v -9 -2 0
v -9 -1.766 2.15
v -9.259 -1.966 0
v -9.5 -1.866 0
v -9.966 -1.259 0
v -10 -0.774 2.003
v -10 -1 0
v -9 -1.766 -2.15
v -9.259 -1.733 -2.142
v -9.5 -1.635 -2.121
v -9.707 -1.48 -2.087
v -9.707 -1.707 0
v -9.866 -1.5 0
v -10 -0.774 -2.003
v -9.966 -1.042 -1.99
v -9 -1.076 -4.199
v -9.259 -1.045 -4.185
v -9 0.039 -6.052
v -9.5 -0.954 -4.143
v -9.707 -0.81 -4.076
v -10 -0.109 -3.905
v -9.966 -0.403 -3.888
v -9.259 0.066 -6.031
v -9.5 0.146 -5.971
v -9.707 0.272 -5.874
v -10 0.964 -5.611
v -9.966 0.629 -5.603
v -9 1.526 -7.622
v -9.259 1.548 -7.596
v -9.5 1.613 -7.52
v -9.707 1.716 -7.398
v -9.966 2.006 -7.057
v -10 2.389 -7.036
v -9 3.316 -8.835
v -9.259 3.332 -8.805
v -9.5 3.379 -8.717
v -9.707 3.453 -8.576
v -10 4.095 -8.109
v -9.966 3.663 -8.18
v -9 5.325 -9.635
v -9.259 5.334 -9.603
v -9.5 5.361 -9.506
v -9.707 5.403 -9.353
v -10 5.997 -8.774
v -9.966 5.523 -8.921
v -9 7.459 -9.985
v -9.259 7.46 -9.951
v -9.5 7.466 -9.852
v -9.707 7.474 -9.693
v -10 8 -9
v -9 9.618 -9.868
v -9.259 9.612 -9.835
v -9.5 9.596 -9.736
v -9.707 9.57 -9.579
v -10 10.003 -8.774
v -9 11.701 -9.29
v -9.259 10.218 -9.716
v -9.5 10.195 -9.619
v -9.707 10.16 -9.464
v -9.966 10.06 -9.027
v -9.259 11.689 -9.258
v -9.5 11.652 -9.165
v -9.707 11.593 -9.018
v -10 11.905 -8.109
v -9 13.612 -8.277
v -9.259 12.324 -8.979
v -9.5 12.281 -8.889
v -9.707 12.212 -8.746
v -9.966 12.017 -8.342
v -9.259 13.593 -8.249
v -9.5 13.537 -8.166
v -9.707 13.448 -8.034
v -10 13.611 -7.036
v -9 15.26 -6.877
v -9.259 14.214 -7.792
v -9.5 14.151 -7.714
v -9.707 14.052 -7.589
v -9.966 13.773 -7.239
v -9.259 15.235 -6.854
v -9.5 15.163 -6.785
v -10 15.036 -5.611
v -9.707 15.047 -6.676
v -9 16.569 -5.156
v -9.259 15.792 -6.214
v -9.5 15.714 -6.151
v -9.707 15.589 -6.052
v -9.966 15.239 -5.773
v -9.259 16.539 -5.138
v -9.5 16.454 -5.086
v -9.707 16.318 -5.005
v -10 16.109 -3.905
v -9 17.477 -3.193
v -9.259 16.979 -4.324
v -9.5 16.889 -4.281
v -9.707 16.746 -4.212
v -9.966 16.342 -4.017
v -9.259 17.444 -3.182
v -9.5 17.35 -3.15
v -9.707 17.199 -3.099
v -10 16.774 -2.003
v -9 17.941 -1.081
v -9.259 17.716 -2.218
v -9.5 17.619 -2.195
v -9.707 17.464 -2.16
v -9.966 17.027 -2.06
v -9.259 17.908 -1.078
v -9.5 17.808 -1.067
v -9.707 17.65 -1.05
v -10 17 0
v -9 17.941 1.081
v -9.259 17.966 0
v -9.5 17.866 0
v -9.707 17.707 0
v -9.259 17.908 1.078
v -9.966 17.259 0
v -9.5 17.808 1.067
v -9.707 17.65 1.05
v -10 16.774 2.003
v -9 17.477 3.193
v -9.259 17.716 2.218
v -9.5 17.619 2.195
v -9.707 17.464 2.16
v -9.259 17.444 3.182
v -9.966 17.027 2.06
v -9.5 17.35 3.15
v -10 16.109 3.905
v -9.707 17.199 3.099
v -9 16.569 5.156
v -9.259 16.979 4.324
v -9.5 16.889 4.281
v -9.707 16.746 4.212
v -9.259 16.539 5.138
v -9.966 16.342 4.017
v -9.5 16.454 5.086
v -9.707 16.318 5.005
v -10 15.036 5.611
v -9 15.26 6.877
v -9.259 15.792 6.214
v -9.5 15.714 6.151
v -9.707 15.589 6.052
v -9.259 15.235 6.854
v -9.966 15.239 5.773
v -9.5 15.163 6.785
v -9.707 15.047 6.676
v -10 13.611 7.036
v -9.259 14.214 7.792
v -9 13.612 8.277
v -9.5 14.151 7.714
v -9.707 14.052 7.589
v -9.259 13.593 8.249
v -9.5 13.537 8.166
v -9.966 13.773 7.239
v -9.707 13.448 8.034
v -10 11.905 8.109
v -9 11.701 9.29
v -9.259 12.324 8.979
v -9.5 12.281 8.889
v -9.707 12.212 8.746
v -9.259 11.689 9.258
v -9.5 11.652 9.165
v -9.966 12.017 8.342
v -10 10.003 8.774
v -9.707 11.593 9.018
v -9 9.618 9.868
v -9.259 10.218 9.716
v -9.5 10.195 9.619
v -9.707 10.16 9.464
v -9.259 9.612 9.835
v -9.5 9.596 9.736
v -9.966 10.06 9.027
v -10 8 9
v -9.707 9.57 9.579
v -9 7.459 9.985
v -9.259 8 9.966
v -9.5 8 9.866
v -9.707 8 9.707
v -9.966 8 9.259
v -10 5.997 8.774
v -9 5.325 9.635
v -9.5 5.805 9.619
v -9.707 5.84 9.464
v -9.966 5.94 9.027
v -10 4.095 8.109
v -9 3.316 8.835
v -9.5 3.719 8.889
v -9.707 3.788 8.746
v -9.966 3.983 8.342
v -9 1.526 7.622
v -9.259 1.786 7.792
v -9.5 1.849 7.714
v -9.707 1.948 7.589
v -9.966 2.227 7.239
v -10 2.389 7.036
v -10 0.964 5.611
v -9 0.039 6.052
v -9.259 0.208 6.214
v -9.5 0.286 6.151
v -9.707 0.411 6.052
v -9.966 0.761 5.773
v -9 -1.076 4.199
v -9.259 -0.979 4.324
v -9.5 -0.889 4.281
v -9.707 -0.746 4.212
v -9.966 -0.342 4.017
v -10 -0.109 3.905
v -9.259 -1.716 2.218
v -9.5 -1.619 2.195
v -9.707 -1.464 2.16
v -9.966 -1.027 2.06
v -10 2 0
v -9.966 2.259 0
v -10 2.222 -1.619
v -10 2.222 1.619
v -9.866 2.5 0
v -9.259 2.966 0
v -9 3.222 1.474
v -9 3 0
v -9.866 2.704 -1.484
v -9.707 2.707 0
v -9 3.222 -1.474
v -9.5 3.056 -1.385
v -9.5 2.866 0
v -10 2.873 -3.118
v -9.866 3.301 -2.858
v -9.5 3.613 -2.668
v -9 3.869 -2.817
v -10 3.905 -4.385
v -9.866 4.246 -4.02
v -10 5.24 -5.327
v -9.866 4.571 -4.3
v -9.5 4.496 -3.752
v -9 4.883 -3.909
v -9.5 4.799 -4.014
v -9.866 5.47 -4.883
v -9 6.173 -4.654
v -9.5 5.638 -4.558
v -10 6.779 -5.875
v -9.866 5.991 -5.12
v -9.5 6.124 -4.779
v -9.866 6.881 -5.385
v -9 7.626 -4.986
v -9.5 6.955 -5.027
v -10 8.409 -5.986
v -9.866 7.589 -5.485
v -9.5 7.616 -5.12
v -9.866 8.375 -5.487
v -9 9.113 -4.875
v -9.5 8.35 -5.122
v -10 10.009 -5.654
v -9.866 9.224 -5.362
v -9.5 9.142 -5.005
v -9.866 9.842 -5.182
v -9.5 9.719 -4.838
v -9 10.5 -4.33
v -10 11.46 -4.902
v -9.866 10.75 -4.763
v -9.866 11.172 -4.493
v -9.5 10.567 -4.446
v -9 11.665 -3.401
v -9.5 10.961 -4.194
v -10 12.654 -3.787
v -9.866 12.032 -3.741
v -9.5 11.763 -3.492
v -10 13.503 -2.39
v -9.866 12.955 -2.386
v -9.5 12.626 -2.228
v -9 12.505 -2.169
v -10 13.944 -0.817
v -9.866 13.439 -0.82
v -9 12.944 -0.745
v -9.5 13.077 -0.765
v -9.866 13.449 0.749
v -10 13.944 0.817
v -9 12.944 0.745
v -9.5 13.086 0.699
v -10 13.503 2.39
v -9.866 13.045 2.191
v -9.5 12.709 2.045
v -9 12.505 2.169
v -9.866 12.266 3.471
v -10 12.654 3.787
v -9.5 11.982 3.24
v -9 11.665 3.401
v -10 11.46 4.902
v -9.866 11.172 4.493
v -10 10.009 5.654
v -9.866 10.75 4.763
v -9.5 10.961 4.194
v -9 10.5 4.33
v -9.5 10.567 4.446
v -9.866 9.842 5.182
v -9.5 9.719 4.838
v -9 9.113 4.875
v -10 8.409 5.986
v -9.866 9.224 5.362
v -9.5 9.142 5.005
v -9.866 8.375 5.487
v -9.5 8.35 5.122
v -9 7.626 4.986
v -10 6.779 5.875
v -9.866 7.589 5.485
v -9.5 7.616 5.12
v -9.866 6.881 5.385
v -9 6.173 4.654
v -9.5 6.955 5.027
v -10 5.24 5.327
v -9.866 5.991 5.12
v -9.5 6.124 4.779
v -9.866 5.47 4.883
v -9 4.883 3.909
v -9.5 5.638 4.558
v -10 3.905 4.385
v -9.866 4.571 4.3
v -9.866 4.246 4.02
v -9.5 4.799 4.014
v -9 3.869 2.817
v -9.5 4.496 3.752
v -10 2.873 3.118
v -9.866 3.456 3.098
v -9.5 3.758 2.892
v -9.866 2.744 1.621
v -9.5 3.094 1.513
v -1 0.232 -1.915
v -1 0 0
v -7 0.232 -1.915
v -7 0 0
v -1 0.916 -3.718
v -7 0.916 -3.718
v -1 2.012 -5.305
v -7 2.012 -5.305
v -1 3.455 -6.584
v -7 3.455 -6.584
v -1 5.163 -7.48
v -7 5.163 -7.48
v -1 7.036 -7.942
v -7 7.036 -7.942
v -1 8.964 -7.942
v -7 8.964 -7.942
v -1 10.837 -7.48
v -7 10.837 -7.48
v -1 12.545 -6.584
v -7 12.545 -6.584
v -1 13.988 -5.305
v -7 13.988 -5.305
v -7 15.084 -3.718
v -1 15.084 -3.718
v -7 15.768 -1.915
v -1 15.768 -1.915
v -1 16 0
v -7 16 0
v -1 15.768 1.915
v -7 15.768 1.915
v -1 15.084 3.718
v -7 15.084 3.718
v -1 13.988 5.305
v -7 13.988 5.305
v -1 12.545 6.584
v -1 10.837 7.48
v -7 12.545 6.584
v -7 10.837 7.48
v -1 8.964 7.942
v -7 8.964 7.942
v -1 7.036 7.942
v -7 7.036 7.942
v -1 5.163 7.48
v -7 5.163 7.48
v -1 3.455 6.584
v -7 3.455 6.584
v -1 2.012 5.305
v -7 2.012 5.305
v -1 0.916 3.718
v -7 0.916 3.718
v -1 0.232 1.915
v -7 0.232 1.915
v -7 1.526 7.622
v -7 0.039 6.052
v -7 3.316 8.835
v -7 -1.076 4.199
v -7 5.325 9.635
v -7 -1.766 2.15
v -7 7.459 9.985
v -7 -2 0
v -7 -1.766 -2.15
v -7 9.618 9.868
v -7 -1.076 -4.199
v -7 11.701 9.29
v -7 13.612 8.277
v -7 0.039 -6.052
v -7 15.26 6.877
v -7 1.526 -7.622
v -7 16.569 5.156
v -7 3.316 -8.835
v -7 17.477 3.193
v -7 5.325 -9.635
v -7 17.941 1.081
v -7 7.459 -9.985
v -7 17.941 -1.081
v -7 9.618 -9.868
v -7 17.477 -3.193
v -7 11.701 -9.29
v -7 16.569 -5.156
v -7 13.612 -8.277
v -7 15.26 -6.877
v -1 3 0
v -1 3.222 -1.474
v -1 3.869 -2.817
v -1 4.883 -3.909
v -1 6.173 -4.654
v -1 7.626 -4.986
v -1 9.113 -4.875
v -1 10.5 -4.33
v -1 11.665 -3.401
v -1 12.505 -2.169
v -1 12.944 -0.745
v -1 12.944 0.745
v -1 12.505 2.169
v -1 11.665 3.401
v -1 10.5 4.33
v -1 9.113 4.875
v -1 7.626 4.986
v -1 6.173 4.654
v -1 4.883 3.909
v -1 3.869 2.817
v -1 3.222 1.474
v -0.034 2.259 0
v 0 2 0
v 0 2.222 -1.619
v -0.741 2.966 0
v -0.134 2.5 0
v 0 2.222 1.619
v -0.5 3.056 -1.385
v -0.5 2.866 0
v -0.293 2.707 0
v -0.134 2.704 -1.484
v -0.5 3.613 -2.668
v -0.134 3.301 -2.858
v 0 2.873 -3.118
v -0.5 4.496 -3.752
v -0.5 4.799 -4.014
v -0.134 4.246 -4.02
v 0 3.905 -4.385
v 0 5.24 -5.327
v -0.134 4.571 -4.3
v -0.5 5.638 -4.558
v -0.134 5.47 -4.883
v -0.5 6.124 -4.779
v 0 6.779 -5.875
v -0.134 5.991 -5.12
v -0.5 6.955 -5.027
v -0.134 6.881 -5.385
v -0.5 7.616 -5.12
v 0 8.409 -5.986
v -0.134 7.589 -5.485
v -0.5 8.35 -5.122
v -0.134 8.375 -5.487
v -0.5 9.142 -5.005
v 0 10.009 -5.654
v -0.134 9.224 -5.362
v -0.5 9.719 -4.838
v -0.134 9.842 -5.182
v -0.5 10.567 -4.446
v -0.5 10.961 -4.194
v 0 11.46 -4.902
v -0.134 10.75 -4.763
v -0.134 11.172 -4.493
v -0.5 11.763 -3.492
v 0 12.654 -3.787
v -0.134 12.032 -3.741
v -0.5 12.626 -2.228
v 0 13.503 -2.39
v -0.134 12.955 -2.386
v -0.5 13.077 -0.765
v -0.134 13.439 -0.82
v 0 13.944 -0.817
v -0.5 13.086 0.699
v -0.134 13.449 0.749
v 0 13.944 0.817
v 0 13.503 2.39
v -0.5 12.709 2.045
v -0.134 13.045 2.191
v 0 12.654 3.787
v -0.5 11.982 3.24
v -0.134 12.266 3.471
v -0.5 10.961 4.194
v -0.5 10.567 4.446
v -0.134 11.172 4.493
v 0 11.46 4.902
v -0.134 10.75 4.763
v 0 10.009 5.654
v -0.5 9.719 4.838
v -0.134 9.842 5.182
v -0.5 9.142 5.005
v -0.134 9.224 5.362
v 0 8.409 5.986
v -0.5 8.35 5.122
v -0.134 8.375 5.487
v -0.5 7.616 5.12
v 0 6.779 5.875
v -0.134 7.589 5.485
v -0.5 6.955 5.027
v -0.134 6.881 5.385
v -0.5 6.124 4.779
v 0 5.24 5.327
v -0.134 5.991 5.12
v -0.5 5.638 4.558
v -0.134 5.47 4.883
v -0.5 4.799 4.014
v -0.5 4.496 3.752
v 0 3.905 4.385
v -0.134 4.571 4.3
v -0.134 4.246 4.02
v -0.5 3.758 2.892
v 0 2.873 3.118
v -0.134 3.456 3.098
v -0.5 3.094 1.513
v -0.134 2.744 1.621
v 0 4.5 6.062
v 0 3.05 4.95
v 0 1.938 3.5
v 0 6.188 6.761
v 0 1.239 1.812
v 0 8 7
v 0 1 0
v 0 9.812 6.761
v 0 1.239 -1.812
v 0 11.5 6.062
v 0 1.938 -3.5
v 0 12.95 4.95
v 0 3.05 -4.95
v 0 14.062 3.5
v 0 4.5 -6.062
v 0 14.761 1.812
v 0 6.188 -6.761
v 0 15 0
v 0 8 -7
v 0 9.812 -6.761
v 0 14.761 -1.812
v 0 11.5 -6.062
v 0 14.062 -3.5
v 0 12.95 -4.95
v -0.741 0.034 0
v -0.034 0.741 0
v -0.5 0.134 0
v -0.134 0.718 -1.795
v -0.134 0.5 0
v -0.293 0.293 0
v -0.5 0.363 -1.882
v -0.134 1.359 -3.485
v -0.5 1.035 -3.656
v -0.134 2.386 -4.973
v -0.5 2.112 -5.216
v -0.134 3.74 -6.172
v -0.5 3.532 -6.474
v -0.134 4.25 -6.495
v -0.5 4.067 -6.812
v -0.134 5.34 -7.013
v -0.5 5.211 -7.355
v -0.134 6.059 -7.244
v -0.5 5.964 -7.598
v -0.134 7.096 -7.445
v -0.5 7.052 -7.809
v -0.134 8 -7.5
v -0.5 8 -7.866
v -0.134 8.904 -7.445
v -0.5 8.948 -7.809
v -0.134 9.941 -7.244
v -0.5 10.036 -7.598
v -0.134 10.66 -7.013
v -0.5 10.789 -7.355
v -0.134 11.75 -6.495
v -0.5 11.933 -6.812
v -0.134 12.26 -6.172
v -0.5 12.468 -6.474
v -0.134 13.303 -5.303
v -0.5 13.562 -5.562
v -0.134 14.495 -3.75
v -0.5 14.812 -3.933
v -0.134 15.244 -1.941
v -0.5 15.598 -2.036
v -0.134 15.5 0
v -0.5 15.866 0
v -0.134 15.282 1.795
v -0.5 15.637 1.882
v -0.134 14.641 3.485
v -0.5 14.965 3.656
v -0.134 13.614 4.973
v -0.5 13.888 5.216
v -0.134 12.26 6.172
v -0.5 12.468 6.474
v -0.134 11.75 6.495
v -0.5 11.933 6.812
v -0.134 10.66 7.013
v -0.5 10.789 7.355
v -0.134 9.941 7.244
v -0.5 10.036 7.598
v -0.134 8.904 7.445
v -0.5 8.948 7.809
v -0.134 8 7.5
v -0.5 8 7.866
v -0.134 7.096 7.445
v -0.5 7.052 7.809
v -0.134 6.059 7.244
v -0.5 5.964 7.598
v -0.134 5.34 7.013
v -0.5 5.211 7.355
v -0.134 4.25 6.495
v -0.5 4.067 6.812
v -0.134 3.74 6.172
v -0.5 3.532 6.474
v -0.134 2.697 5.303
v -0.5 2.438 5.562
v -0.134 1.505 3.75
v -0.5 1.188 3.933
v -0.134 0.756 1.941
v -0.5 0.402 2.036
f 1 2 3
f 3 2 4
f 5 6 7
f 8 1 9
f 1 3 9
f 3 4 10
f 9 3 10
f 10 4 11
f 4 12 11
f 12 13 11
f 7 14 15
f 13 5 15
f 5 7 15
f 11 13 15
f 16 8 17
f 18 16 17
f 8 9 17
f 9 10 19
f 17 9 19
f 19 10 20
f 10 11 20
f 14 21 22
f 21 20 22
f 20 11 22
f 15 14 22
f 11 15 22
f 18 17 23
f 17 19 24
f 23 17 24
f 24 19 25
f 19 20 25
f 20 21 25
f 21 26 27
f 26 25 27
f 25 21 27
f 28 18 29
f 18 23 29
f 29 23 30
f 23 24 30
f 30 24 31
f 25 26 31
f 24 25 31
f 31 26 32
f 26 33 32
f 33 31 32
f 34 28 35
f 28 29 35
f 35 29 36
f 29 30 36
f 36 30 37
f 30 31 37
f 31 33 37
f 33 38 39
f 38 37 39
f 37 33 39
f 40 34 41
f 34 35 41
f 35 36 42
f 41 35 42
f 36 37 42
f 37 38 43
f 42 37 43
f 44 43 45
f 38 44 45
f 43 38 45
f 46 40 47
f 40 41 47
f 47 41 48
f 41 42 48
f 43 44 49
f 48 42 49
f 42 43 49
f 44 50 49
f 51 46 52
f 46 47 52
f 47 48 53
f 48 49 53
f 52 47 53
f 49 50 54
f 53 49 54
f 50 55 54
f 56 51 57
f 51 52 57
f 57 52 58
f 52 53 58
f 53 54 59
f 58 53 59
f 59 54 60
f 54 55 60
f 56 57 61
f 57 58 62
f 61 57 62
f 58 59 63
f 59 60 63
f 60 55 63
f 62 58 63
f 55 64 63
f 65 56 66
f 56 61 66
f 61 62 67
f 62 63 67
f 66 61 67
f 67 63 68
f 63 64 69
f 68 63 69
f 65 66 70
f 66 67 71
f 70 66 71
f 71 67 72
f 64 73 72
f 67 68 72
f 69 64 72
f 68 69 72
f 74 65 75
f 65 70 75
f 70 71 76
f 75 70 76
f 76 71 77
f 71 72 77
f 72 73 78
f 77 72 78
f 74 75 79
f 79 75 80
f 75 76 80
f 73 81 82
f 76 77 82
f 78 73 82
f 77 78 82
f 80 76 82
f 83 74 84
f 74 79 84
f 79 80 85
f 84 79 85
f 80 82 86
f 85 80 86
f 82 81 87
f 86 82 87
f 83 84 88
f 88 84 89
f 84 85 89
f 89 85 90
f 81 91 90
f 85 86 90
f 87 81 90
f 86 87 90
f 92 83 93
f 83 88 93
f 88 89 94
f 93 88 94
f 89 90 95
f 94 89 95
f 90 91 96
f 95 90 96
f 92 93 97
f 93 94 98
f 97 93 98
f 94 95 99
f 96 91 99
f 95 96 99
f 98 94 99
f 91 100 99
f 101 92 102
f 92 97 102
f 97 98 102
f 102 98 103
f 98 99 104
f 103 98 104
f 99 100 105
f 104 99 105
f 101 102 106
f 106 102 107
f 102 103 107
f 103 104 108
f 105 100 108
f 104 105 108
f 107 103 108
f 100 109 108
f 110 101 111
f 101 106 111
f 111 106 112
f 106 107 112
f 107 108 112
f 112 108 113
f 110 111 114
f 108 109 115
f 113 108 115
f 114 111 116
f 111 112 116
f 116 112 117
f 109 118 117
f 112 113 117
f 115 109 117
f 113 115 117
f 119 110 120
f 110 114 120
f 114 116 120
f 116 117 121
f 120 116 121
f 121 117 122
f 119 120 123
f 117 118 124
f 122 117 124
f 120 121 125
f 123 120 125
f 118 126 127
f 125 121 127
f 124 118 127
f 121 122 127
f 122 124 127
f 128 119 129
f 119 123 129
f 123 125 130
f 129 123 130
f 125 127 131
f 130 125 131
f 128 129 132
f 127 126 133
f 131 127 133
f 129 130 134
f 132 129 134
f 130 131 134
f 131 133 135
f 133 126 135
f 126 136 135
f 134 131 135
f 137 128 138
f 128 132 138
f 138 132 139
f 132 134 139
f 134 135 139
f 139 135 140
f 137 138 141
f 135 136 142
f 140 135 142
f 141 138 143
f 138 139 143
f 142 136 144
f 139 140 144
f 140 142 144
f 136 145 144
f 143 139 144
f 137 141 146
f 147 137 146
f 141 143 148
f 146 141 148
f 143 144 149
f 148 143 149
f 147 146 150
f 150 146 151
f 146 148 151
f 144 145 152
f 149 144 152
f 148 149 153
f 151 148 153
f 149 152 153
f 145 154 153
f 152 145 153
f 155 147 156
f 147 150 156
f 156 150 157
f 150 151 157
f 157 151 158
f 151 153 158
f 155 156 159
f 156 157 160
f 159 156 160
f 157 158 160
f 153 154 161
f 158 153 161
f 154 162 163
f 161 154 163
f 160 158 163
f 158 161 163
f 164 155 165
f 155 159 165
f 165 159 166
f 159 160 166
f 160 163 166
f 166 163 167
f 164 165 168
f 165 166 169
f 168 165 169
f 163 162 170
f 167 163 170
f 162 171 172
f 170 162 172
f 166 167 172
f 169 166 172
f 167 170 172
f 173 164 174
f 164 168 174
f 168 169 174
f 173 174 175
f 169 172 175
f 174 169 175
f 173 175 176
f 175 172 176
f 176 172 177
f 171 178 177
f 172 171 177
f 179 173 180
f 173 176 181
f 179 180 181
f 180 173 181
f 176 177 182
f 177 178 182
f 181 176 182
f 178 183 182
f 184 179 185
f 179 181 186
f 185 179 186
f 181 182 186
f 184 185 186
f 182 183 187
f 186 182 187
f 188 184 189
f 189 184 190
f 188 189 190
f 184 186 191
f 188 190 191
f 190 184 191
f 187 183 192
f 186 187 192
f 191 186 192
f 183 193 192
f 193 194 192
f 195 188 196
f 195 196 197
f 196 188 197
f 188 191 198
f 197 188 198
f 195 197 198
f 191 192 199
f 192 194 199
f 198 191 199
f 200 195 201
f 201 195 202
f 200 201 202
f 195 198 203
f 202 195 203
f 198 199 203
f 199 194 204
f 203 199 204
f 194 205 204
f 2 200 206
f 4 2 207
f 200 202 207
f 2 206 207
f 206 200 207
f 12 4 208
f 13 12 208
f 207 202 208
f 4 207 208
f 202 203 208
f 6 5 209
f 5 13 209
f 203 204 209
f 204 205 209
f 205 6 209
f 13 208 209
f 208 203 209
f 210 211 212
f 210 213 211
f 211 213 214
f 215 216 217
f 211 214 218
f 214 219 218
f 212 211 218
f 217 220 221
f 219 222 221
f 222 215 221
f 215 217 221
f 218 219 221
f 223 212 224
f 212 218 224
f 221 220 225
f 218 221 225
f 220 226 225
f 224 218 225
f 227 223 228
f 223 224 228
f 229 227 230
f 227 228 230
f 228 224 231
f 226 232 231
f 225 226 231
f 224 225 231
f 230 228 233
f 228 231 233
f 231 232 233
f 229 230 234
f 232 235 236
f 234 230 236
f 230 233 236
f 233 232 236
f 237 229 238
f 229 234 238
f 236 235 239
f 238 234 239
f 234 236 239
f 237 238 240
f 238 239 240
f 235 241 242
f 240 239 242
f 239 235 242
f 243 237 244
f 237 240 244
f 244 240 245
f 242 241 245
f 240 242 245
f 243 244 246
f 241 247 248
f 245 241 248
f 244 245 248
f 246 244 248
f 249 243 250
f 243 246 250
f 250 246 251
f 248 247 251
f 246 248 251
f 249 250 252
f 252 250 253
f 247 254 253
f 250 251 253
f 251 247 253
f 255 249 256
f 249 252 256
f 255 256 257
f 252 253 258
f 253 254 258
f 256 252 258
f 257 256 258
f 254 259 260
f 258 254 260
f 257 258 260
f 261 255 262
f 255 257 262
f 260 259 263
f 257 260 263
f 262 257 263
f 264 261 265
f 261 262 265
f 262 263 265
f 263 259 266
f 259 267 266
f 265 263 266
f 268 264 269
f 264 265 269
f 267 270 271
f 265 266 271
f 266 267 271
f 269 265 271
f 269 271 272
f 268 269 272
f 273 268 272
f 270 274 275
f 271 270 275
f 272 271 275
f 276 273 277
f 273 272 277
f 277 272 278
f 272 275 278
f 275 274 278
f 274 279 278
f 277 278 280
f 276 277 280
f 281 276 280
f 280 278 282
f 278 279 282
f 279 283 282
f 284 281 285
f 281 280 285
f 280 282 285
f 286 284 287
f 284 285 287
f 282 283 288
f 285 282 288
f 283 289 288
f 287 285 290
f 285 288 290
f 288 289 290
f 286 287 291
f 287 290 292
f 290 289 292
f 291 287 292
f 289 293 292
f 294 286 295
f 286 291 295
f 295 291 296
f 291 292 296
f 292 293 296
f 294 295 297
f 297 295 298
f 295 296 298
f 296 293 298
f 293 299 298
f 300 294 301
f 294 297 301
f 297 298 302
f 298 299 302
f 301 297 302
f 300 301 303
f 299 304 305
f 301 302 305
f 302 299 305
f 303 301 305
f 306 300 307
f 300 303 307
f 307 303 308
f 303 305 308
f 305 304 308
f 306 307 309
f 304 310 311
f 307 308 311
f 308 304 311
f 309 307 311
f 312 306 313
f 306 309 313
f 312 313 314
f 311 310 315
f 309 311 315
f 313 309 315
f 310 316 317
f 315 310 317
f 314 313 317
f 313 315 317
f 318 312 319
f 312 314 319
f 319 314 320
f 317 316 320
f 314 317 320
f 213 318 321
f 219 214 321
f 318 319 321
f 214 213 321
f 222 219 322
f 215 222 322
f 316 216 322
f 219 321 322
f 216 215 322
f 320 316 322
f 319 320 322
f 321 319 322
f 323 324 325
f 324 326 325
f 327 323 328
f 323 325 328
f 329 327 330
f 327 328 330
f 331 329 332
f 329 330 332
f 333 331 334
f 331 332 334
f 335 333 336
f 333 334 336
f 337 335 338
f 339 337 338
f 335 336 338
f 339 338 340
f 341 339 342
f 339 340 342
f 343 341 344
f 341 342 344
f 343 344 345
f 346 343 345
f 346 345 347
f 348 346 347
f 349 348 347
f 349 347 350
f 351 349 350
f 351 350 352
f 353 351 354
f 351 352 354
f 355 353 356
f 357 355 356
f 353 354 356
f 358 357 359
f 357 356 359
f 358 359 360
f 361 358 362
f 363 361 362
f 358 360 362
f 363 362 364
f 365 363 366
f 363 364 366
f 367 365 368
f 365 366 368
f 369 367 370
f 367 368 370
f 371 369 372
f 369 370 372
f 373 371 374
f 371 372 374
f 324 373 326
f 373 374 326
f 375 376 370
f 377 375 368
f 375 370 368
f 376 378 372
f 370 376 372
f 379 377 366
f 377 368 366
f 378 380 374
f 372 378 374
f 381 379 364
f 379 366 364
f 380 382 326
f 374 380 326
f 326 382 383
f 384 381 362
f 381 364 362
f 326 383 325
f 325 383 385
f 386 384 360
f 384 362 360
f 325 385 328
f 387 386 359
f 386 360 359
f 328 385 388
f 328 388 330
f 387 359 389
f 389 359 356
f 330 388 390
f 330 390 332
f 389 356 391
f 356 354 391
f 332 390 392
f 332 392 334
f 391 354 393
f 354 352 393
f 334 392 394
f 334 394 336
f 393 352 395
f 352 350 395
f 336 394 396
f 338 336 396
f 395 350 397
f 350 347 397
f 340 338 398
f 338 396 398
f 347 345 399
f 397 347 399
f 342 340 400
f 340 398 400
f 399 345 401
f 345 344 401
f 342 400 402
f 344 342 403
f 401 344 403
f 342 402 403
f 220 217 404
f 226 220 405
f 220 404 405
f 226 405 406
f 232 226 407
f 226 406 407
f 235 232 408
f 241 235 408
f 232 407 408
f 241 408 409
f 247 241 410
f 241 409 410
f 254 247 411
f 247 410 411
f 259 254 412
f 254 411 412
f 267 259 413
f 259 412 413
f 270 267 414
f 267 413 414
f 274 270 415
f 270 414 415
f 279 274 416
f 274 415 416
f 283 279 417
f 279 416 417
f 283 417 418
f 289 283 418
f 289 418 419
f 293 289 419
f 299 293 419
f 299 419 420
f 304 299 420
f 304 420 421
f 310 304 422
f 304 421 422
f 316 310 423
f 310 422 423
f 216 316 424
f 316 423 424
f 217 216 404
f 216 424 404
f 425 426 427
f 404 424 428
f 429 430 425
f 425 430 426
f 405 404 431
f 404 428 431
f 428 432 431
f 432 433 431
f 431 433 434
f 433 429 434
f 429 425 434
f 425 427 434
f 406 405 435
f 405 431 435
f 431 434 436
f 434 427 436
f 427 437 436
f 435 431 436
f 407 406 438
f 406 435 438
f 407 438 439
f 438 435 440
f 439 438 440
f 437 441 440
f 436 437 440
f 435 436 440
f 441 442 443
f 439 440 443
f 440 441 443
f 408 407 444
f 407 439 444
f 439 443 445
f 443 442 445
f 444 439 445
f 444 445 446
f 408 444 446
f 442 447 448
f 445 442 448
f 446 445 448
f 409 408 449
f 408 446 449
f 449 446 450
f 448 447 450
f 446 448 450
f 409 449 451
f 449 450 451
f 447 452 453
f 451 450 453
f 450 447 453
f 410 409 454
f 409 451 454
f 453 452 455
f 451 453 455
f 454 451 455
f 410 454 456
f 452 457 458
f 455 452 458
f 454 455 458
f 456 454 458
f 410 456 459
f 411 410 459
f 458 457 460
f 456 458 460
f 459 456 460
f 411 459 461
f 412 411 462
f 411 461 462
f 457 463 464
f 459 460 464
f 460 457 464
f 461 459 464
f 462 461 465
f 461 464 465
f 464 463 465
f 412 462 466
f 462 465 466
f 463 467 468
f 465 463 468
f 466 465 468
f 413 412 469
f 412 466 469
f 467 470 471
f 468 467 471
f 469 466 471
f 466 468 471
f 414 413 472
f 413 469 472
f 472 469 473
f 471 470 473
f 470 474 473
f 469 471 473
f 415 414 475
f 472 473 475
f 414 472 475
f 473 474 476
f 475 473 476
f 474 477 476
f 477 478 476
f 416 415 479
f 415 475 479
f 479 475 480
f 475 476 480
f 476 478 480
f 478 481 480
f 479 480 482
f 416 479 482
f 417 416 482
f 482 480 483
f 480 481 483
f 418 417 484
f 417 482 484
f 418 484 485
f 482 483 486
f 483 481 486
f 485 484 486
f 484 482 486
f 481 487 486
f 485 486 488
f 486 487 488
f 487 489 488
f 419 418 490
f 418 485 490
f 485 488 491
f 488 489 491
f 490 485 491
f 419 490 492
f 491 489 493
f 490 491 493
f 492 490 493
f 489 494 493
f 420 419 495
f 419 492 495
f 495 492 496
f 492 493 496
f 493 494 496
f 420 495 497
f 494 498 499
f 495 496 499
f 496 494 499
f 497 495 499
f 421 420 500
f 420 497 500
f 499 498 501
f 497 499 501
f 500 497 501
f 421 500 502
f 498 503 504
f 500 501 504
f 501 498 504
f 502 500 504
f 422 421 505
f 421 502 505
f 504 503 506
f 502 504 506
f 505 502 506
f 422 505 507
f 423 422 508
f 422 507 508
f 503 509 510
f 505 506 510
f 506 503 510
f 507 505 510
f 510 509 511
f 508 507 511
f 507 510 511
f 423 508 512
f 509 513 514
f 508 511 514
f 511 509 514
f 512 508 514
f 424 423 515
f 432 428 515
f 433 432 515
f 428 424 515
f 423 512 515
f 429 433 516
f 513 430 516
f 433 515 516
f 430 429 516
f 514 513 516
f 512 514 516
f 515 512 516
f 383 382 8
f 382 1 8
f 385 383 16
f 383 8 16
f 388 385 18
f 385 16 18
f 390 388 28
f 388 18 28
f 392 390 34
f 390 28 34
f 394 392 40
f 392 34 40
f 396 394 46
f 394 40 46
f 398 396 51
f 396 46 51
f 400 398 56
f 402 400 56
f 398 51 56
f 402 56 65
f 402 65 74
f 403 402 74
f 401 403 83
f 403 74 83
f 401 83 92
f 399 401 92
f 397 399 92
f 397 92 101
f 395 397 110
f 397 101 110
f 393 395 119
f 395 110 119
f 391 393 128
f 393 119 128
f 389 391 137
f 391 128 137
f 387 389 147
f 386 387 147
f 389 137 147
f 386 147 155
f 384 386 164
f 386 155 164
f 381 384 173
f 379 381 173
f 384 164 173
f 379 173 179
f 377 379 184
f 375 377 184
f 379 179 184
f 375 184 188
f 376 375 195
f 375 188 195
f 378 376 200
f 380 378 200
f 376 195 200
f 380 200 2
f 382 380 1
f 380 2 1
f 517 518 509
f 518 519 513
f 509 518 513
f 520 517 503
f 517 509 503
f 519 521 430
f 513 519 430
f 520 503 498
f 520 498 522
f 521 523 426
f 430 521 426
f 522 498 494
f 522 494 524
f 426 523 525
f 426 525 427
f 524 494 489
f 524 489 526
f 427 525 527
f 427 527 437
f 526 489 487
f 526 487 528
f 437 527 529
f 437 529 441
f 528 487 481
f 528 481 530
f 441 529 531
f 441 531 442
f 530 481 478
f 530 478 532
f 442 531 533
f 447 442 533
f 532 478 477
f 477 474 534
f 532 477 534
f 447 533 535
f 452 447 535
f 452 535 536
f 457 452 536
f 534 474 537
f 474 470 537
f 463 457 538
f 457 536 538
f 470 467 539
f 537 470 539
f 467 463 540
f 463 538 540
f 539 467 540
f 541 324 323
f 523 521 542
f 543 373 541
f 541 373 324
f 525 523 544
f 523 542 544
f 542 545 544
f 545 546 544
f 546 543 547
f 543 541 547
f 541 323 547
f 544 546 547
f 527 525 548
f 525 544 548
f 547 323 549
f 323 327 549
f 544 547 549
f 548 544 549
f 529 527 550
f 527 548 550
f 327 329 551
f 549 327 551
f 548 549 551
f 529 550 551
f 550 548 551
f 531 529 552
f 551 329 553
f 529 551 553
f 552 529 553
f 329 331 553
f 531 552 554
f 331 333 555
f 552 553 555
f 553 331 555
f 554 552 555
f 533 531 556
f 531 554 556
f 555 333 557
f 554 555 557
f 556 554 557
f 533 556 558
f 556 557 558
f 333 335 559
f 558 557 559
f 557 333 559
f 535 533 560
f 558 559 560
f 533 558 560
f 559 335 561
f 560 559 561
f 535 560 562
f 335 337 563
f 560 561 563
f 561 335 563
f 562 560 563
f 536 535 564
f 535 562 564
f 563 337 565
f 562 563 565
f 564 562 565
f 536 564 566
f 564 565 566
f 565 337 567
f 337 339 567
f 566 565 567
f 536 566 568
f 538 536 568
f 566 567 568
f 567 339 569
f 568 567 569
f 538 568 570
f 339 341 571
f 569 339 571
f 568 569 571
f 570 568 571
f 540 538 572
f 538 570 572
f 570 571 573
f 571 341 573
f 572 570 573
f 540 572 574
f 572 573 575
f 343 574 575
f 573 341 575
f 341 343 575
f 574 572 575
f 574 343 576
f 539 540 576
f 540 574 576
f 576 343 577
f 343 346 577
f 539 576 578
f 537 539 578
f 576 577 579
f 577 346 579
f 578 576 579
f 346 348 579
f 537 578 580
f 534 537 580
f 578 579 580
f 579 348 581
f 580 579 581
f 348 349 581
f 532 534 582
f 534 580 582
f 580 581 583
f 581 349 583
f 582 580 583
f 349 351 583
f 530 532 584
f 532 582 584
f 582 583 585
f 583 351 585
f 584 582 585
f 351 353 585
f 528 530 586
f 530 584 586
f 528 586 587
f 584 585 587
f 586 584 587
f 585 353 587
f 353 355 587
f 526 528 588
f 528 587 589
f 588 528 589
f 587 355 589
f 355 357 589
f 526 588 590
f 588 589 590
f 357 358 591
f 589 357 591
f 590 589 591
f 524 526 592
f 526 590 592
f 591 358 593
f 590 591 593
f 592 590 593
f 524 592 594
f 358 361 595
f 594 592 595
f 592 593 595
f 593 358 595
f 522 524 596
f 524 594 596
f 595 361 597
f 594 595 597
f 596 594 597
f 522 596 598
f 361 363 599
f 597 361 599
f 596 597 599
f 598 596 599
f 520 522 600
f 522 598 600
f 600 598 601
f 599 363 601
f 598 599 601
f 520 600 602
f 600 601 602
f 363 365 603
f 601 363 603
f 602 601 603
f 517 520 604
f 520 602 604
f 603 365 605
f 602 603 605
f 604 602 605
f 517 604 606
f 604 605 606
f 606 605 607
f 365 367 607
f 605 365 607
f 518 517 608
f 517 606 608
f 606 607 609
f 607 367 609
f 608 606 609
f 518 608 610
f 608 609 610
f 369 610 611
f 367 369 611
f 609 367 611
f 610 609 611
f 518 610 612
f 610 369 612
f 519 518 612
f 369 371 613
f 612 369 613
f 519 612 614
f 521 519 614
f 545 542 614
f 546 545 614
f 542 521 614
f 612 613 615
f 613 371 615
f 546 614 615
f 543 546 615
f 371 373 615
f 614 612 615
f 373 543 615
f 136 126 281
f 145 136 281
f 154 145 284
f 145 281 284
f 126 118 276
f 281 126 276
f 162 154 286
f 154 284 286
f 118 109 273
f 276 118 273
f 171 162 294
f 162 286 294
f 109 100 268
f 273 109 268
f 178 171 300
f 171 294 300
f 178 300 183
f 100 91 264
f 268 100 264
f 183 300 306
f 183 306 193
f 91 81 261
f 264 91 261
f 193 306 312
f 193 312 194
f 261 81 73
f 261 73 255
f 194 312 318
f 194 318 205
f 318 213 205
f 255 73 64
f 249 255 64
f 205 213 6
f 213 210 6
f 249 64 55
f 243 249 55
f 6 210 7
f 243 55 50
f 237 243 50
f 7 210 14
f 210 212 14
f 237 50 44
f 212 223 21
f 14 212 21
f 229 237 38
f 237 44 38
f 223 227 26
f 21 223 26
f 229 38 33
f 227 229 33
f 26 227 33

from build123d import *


with BuildPart() as part:
    # Sketch1 → Revolve1 (revolve)
    with BuildSketch(Plane.XY):
        with BuildLine():
            Line((-1, 0), (-7, 0))
            Line((-7, 0), (-7, -2))
            Line((-7, -2), (-9, -2))
            ThreePointArc((-9, -2), (-9.707106781, -1.707106781), (-10, -1))
            Line((-10, -1), (-10, 2))
            ThreePointArc((-10, 2), (-9.707106781, 2.707106781), (-9, 3))
            Line((-9, 3), (-1, 3))
            ThreePointArc((-1, 3), (-0.292893219, 2.707106781), (0, 2))
            Line((0, 2), (0, 1))
            ThreePointArc((0, 1), (-0.292893219, 0.292893219), (-1, 0))
        make_face()
    revolve(axis=Axis((-10, 8, 0), (1, 0, 0)))


solid = part.part
